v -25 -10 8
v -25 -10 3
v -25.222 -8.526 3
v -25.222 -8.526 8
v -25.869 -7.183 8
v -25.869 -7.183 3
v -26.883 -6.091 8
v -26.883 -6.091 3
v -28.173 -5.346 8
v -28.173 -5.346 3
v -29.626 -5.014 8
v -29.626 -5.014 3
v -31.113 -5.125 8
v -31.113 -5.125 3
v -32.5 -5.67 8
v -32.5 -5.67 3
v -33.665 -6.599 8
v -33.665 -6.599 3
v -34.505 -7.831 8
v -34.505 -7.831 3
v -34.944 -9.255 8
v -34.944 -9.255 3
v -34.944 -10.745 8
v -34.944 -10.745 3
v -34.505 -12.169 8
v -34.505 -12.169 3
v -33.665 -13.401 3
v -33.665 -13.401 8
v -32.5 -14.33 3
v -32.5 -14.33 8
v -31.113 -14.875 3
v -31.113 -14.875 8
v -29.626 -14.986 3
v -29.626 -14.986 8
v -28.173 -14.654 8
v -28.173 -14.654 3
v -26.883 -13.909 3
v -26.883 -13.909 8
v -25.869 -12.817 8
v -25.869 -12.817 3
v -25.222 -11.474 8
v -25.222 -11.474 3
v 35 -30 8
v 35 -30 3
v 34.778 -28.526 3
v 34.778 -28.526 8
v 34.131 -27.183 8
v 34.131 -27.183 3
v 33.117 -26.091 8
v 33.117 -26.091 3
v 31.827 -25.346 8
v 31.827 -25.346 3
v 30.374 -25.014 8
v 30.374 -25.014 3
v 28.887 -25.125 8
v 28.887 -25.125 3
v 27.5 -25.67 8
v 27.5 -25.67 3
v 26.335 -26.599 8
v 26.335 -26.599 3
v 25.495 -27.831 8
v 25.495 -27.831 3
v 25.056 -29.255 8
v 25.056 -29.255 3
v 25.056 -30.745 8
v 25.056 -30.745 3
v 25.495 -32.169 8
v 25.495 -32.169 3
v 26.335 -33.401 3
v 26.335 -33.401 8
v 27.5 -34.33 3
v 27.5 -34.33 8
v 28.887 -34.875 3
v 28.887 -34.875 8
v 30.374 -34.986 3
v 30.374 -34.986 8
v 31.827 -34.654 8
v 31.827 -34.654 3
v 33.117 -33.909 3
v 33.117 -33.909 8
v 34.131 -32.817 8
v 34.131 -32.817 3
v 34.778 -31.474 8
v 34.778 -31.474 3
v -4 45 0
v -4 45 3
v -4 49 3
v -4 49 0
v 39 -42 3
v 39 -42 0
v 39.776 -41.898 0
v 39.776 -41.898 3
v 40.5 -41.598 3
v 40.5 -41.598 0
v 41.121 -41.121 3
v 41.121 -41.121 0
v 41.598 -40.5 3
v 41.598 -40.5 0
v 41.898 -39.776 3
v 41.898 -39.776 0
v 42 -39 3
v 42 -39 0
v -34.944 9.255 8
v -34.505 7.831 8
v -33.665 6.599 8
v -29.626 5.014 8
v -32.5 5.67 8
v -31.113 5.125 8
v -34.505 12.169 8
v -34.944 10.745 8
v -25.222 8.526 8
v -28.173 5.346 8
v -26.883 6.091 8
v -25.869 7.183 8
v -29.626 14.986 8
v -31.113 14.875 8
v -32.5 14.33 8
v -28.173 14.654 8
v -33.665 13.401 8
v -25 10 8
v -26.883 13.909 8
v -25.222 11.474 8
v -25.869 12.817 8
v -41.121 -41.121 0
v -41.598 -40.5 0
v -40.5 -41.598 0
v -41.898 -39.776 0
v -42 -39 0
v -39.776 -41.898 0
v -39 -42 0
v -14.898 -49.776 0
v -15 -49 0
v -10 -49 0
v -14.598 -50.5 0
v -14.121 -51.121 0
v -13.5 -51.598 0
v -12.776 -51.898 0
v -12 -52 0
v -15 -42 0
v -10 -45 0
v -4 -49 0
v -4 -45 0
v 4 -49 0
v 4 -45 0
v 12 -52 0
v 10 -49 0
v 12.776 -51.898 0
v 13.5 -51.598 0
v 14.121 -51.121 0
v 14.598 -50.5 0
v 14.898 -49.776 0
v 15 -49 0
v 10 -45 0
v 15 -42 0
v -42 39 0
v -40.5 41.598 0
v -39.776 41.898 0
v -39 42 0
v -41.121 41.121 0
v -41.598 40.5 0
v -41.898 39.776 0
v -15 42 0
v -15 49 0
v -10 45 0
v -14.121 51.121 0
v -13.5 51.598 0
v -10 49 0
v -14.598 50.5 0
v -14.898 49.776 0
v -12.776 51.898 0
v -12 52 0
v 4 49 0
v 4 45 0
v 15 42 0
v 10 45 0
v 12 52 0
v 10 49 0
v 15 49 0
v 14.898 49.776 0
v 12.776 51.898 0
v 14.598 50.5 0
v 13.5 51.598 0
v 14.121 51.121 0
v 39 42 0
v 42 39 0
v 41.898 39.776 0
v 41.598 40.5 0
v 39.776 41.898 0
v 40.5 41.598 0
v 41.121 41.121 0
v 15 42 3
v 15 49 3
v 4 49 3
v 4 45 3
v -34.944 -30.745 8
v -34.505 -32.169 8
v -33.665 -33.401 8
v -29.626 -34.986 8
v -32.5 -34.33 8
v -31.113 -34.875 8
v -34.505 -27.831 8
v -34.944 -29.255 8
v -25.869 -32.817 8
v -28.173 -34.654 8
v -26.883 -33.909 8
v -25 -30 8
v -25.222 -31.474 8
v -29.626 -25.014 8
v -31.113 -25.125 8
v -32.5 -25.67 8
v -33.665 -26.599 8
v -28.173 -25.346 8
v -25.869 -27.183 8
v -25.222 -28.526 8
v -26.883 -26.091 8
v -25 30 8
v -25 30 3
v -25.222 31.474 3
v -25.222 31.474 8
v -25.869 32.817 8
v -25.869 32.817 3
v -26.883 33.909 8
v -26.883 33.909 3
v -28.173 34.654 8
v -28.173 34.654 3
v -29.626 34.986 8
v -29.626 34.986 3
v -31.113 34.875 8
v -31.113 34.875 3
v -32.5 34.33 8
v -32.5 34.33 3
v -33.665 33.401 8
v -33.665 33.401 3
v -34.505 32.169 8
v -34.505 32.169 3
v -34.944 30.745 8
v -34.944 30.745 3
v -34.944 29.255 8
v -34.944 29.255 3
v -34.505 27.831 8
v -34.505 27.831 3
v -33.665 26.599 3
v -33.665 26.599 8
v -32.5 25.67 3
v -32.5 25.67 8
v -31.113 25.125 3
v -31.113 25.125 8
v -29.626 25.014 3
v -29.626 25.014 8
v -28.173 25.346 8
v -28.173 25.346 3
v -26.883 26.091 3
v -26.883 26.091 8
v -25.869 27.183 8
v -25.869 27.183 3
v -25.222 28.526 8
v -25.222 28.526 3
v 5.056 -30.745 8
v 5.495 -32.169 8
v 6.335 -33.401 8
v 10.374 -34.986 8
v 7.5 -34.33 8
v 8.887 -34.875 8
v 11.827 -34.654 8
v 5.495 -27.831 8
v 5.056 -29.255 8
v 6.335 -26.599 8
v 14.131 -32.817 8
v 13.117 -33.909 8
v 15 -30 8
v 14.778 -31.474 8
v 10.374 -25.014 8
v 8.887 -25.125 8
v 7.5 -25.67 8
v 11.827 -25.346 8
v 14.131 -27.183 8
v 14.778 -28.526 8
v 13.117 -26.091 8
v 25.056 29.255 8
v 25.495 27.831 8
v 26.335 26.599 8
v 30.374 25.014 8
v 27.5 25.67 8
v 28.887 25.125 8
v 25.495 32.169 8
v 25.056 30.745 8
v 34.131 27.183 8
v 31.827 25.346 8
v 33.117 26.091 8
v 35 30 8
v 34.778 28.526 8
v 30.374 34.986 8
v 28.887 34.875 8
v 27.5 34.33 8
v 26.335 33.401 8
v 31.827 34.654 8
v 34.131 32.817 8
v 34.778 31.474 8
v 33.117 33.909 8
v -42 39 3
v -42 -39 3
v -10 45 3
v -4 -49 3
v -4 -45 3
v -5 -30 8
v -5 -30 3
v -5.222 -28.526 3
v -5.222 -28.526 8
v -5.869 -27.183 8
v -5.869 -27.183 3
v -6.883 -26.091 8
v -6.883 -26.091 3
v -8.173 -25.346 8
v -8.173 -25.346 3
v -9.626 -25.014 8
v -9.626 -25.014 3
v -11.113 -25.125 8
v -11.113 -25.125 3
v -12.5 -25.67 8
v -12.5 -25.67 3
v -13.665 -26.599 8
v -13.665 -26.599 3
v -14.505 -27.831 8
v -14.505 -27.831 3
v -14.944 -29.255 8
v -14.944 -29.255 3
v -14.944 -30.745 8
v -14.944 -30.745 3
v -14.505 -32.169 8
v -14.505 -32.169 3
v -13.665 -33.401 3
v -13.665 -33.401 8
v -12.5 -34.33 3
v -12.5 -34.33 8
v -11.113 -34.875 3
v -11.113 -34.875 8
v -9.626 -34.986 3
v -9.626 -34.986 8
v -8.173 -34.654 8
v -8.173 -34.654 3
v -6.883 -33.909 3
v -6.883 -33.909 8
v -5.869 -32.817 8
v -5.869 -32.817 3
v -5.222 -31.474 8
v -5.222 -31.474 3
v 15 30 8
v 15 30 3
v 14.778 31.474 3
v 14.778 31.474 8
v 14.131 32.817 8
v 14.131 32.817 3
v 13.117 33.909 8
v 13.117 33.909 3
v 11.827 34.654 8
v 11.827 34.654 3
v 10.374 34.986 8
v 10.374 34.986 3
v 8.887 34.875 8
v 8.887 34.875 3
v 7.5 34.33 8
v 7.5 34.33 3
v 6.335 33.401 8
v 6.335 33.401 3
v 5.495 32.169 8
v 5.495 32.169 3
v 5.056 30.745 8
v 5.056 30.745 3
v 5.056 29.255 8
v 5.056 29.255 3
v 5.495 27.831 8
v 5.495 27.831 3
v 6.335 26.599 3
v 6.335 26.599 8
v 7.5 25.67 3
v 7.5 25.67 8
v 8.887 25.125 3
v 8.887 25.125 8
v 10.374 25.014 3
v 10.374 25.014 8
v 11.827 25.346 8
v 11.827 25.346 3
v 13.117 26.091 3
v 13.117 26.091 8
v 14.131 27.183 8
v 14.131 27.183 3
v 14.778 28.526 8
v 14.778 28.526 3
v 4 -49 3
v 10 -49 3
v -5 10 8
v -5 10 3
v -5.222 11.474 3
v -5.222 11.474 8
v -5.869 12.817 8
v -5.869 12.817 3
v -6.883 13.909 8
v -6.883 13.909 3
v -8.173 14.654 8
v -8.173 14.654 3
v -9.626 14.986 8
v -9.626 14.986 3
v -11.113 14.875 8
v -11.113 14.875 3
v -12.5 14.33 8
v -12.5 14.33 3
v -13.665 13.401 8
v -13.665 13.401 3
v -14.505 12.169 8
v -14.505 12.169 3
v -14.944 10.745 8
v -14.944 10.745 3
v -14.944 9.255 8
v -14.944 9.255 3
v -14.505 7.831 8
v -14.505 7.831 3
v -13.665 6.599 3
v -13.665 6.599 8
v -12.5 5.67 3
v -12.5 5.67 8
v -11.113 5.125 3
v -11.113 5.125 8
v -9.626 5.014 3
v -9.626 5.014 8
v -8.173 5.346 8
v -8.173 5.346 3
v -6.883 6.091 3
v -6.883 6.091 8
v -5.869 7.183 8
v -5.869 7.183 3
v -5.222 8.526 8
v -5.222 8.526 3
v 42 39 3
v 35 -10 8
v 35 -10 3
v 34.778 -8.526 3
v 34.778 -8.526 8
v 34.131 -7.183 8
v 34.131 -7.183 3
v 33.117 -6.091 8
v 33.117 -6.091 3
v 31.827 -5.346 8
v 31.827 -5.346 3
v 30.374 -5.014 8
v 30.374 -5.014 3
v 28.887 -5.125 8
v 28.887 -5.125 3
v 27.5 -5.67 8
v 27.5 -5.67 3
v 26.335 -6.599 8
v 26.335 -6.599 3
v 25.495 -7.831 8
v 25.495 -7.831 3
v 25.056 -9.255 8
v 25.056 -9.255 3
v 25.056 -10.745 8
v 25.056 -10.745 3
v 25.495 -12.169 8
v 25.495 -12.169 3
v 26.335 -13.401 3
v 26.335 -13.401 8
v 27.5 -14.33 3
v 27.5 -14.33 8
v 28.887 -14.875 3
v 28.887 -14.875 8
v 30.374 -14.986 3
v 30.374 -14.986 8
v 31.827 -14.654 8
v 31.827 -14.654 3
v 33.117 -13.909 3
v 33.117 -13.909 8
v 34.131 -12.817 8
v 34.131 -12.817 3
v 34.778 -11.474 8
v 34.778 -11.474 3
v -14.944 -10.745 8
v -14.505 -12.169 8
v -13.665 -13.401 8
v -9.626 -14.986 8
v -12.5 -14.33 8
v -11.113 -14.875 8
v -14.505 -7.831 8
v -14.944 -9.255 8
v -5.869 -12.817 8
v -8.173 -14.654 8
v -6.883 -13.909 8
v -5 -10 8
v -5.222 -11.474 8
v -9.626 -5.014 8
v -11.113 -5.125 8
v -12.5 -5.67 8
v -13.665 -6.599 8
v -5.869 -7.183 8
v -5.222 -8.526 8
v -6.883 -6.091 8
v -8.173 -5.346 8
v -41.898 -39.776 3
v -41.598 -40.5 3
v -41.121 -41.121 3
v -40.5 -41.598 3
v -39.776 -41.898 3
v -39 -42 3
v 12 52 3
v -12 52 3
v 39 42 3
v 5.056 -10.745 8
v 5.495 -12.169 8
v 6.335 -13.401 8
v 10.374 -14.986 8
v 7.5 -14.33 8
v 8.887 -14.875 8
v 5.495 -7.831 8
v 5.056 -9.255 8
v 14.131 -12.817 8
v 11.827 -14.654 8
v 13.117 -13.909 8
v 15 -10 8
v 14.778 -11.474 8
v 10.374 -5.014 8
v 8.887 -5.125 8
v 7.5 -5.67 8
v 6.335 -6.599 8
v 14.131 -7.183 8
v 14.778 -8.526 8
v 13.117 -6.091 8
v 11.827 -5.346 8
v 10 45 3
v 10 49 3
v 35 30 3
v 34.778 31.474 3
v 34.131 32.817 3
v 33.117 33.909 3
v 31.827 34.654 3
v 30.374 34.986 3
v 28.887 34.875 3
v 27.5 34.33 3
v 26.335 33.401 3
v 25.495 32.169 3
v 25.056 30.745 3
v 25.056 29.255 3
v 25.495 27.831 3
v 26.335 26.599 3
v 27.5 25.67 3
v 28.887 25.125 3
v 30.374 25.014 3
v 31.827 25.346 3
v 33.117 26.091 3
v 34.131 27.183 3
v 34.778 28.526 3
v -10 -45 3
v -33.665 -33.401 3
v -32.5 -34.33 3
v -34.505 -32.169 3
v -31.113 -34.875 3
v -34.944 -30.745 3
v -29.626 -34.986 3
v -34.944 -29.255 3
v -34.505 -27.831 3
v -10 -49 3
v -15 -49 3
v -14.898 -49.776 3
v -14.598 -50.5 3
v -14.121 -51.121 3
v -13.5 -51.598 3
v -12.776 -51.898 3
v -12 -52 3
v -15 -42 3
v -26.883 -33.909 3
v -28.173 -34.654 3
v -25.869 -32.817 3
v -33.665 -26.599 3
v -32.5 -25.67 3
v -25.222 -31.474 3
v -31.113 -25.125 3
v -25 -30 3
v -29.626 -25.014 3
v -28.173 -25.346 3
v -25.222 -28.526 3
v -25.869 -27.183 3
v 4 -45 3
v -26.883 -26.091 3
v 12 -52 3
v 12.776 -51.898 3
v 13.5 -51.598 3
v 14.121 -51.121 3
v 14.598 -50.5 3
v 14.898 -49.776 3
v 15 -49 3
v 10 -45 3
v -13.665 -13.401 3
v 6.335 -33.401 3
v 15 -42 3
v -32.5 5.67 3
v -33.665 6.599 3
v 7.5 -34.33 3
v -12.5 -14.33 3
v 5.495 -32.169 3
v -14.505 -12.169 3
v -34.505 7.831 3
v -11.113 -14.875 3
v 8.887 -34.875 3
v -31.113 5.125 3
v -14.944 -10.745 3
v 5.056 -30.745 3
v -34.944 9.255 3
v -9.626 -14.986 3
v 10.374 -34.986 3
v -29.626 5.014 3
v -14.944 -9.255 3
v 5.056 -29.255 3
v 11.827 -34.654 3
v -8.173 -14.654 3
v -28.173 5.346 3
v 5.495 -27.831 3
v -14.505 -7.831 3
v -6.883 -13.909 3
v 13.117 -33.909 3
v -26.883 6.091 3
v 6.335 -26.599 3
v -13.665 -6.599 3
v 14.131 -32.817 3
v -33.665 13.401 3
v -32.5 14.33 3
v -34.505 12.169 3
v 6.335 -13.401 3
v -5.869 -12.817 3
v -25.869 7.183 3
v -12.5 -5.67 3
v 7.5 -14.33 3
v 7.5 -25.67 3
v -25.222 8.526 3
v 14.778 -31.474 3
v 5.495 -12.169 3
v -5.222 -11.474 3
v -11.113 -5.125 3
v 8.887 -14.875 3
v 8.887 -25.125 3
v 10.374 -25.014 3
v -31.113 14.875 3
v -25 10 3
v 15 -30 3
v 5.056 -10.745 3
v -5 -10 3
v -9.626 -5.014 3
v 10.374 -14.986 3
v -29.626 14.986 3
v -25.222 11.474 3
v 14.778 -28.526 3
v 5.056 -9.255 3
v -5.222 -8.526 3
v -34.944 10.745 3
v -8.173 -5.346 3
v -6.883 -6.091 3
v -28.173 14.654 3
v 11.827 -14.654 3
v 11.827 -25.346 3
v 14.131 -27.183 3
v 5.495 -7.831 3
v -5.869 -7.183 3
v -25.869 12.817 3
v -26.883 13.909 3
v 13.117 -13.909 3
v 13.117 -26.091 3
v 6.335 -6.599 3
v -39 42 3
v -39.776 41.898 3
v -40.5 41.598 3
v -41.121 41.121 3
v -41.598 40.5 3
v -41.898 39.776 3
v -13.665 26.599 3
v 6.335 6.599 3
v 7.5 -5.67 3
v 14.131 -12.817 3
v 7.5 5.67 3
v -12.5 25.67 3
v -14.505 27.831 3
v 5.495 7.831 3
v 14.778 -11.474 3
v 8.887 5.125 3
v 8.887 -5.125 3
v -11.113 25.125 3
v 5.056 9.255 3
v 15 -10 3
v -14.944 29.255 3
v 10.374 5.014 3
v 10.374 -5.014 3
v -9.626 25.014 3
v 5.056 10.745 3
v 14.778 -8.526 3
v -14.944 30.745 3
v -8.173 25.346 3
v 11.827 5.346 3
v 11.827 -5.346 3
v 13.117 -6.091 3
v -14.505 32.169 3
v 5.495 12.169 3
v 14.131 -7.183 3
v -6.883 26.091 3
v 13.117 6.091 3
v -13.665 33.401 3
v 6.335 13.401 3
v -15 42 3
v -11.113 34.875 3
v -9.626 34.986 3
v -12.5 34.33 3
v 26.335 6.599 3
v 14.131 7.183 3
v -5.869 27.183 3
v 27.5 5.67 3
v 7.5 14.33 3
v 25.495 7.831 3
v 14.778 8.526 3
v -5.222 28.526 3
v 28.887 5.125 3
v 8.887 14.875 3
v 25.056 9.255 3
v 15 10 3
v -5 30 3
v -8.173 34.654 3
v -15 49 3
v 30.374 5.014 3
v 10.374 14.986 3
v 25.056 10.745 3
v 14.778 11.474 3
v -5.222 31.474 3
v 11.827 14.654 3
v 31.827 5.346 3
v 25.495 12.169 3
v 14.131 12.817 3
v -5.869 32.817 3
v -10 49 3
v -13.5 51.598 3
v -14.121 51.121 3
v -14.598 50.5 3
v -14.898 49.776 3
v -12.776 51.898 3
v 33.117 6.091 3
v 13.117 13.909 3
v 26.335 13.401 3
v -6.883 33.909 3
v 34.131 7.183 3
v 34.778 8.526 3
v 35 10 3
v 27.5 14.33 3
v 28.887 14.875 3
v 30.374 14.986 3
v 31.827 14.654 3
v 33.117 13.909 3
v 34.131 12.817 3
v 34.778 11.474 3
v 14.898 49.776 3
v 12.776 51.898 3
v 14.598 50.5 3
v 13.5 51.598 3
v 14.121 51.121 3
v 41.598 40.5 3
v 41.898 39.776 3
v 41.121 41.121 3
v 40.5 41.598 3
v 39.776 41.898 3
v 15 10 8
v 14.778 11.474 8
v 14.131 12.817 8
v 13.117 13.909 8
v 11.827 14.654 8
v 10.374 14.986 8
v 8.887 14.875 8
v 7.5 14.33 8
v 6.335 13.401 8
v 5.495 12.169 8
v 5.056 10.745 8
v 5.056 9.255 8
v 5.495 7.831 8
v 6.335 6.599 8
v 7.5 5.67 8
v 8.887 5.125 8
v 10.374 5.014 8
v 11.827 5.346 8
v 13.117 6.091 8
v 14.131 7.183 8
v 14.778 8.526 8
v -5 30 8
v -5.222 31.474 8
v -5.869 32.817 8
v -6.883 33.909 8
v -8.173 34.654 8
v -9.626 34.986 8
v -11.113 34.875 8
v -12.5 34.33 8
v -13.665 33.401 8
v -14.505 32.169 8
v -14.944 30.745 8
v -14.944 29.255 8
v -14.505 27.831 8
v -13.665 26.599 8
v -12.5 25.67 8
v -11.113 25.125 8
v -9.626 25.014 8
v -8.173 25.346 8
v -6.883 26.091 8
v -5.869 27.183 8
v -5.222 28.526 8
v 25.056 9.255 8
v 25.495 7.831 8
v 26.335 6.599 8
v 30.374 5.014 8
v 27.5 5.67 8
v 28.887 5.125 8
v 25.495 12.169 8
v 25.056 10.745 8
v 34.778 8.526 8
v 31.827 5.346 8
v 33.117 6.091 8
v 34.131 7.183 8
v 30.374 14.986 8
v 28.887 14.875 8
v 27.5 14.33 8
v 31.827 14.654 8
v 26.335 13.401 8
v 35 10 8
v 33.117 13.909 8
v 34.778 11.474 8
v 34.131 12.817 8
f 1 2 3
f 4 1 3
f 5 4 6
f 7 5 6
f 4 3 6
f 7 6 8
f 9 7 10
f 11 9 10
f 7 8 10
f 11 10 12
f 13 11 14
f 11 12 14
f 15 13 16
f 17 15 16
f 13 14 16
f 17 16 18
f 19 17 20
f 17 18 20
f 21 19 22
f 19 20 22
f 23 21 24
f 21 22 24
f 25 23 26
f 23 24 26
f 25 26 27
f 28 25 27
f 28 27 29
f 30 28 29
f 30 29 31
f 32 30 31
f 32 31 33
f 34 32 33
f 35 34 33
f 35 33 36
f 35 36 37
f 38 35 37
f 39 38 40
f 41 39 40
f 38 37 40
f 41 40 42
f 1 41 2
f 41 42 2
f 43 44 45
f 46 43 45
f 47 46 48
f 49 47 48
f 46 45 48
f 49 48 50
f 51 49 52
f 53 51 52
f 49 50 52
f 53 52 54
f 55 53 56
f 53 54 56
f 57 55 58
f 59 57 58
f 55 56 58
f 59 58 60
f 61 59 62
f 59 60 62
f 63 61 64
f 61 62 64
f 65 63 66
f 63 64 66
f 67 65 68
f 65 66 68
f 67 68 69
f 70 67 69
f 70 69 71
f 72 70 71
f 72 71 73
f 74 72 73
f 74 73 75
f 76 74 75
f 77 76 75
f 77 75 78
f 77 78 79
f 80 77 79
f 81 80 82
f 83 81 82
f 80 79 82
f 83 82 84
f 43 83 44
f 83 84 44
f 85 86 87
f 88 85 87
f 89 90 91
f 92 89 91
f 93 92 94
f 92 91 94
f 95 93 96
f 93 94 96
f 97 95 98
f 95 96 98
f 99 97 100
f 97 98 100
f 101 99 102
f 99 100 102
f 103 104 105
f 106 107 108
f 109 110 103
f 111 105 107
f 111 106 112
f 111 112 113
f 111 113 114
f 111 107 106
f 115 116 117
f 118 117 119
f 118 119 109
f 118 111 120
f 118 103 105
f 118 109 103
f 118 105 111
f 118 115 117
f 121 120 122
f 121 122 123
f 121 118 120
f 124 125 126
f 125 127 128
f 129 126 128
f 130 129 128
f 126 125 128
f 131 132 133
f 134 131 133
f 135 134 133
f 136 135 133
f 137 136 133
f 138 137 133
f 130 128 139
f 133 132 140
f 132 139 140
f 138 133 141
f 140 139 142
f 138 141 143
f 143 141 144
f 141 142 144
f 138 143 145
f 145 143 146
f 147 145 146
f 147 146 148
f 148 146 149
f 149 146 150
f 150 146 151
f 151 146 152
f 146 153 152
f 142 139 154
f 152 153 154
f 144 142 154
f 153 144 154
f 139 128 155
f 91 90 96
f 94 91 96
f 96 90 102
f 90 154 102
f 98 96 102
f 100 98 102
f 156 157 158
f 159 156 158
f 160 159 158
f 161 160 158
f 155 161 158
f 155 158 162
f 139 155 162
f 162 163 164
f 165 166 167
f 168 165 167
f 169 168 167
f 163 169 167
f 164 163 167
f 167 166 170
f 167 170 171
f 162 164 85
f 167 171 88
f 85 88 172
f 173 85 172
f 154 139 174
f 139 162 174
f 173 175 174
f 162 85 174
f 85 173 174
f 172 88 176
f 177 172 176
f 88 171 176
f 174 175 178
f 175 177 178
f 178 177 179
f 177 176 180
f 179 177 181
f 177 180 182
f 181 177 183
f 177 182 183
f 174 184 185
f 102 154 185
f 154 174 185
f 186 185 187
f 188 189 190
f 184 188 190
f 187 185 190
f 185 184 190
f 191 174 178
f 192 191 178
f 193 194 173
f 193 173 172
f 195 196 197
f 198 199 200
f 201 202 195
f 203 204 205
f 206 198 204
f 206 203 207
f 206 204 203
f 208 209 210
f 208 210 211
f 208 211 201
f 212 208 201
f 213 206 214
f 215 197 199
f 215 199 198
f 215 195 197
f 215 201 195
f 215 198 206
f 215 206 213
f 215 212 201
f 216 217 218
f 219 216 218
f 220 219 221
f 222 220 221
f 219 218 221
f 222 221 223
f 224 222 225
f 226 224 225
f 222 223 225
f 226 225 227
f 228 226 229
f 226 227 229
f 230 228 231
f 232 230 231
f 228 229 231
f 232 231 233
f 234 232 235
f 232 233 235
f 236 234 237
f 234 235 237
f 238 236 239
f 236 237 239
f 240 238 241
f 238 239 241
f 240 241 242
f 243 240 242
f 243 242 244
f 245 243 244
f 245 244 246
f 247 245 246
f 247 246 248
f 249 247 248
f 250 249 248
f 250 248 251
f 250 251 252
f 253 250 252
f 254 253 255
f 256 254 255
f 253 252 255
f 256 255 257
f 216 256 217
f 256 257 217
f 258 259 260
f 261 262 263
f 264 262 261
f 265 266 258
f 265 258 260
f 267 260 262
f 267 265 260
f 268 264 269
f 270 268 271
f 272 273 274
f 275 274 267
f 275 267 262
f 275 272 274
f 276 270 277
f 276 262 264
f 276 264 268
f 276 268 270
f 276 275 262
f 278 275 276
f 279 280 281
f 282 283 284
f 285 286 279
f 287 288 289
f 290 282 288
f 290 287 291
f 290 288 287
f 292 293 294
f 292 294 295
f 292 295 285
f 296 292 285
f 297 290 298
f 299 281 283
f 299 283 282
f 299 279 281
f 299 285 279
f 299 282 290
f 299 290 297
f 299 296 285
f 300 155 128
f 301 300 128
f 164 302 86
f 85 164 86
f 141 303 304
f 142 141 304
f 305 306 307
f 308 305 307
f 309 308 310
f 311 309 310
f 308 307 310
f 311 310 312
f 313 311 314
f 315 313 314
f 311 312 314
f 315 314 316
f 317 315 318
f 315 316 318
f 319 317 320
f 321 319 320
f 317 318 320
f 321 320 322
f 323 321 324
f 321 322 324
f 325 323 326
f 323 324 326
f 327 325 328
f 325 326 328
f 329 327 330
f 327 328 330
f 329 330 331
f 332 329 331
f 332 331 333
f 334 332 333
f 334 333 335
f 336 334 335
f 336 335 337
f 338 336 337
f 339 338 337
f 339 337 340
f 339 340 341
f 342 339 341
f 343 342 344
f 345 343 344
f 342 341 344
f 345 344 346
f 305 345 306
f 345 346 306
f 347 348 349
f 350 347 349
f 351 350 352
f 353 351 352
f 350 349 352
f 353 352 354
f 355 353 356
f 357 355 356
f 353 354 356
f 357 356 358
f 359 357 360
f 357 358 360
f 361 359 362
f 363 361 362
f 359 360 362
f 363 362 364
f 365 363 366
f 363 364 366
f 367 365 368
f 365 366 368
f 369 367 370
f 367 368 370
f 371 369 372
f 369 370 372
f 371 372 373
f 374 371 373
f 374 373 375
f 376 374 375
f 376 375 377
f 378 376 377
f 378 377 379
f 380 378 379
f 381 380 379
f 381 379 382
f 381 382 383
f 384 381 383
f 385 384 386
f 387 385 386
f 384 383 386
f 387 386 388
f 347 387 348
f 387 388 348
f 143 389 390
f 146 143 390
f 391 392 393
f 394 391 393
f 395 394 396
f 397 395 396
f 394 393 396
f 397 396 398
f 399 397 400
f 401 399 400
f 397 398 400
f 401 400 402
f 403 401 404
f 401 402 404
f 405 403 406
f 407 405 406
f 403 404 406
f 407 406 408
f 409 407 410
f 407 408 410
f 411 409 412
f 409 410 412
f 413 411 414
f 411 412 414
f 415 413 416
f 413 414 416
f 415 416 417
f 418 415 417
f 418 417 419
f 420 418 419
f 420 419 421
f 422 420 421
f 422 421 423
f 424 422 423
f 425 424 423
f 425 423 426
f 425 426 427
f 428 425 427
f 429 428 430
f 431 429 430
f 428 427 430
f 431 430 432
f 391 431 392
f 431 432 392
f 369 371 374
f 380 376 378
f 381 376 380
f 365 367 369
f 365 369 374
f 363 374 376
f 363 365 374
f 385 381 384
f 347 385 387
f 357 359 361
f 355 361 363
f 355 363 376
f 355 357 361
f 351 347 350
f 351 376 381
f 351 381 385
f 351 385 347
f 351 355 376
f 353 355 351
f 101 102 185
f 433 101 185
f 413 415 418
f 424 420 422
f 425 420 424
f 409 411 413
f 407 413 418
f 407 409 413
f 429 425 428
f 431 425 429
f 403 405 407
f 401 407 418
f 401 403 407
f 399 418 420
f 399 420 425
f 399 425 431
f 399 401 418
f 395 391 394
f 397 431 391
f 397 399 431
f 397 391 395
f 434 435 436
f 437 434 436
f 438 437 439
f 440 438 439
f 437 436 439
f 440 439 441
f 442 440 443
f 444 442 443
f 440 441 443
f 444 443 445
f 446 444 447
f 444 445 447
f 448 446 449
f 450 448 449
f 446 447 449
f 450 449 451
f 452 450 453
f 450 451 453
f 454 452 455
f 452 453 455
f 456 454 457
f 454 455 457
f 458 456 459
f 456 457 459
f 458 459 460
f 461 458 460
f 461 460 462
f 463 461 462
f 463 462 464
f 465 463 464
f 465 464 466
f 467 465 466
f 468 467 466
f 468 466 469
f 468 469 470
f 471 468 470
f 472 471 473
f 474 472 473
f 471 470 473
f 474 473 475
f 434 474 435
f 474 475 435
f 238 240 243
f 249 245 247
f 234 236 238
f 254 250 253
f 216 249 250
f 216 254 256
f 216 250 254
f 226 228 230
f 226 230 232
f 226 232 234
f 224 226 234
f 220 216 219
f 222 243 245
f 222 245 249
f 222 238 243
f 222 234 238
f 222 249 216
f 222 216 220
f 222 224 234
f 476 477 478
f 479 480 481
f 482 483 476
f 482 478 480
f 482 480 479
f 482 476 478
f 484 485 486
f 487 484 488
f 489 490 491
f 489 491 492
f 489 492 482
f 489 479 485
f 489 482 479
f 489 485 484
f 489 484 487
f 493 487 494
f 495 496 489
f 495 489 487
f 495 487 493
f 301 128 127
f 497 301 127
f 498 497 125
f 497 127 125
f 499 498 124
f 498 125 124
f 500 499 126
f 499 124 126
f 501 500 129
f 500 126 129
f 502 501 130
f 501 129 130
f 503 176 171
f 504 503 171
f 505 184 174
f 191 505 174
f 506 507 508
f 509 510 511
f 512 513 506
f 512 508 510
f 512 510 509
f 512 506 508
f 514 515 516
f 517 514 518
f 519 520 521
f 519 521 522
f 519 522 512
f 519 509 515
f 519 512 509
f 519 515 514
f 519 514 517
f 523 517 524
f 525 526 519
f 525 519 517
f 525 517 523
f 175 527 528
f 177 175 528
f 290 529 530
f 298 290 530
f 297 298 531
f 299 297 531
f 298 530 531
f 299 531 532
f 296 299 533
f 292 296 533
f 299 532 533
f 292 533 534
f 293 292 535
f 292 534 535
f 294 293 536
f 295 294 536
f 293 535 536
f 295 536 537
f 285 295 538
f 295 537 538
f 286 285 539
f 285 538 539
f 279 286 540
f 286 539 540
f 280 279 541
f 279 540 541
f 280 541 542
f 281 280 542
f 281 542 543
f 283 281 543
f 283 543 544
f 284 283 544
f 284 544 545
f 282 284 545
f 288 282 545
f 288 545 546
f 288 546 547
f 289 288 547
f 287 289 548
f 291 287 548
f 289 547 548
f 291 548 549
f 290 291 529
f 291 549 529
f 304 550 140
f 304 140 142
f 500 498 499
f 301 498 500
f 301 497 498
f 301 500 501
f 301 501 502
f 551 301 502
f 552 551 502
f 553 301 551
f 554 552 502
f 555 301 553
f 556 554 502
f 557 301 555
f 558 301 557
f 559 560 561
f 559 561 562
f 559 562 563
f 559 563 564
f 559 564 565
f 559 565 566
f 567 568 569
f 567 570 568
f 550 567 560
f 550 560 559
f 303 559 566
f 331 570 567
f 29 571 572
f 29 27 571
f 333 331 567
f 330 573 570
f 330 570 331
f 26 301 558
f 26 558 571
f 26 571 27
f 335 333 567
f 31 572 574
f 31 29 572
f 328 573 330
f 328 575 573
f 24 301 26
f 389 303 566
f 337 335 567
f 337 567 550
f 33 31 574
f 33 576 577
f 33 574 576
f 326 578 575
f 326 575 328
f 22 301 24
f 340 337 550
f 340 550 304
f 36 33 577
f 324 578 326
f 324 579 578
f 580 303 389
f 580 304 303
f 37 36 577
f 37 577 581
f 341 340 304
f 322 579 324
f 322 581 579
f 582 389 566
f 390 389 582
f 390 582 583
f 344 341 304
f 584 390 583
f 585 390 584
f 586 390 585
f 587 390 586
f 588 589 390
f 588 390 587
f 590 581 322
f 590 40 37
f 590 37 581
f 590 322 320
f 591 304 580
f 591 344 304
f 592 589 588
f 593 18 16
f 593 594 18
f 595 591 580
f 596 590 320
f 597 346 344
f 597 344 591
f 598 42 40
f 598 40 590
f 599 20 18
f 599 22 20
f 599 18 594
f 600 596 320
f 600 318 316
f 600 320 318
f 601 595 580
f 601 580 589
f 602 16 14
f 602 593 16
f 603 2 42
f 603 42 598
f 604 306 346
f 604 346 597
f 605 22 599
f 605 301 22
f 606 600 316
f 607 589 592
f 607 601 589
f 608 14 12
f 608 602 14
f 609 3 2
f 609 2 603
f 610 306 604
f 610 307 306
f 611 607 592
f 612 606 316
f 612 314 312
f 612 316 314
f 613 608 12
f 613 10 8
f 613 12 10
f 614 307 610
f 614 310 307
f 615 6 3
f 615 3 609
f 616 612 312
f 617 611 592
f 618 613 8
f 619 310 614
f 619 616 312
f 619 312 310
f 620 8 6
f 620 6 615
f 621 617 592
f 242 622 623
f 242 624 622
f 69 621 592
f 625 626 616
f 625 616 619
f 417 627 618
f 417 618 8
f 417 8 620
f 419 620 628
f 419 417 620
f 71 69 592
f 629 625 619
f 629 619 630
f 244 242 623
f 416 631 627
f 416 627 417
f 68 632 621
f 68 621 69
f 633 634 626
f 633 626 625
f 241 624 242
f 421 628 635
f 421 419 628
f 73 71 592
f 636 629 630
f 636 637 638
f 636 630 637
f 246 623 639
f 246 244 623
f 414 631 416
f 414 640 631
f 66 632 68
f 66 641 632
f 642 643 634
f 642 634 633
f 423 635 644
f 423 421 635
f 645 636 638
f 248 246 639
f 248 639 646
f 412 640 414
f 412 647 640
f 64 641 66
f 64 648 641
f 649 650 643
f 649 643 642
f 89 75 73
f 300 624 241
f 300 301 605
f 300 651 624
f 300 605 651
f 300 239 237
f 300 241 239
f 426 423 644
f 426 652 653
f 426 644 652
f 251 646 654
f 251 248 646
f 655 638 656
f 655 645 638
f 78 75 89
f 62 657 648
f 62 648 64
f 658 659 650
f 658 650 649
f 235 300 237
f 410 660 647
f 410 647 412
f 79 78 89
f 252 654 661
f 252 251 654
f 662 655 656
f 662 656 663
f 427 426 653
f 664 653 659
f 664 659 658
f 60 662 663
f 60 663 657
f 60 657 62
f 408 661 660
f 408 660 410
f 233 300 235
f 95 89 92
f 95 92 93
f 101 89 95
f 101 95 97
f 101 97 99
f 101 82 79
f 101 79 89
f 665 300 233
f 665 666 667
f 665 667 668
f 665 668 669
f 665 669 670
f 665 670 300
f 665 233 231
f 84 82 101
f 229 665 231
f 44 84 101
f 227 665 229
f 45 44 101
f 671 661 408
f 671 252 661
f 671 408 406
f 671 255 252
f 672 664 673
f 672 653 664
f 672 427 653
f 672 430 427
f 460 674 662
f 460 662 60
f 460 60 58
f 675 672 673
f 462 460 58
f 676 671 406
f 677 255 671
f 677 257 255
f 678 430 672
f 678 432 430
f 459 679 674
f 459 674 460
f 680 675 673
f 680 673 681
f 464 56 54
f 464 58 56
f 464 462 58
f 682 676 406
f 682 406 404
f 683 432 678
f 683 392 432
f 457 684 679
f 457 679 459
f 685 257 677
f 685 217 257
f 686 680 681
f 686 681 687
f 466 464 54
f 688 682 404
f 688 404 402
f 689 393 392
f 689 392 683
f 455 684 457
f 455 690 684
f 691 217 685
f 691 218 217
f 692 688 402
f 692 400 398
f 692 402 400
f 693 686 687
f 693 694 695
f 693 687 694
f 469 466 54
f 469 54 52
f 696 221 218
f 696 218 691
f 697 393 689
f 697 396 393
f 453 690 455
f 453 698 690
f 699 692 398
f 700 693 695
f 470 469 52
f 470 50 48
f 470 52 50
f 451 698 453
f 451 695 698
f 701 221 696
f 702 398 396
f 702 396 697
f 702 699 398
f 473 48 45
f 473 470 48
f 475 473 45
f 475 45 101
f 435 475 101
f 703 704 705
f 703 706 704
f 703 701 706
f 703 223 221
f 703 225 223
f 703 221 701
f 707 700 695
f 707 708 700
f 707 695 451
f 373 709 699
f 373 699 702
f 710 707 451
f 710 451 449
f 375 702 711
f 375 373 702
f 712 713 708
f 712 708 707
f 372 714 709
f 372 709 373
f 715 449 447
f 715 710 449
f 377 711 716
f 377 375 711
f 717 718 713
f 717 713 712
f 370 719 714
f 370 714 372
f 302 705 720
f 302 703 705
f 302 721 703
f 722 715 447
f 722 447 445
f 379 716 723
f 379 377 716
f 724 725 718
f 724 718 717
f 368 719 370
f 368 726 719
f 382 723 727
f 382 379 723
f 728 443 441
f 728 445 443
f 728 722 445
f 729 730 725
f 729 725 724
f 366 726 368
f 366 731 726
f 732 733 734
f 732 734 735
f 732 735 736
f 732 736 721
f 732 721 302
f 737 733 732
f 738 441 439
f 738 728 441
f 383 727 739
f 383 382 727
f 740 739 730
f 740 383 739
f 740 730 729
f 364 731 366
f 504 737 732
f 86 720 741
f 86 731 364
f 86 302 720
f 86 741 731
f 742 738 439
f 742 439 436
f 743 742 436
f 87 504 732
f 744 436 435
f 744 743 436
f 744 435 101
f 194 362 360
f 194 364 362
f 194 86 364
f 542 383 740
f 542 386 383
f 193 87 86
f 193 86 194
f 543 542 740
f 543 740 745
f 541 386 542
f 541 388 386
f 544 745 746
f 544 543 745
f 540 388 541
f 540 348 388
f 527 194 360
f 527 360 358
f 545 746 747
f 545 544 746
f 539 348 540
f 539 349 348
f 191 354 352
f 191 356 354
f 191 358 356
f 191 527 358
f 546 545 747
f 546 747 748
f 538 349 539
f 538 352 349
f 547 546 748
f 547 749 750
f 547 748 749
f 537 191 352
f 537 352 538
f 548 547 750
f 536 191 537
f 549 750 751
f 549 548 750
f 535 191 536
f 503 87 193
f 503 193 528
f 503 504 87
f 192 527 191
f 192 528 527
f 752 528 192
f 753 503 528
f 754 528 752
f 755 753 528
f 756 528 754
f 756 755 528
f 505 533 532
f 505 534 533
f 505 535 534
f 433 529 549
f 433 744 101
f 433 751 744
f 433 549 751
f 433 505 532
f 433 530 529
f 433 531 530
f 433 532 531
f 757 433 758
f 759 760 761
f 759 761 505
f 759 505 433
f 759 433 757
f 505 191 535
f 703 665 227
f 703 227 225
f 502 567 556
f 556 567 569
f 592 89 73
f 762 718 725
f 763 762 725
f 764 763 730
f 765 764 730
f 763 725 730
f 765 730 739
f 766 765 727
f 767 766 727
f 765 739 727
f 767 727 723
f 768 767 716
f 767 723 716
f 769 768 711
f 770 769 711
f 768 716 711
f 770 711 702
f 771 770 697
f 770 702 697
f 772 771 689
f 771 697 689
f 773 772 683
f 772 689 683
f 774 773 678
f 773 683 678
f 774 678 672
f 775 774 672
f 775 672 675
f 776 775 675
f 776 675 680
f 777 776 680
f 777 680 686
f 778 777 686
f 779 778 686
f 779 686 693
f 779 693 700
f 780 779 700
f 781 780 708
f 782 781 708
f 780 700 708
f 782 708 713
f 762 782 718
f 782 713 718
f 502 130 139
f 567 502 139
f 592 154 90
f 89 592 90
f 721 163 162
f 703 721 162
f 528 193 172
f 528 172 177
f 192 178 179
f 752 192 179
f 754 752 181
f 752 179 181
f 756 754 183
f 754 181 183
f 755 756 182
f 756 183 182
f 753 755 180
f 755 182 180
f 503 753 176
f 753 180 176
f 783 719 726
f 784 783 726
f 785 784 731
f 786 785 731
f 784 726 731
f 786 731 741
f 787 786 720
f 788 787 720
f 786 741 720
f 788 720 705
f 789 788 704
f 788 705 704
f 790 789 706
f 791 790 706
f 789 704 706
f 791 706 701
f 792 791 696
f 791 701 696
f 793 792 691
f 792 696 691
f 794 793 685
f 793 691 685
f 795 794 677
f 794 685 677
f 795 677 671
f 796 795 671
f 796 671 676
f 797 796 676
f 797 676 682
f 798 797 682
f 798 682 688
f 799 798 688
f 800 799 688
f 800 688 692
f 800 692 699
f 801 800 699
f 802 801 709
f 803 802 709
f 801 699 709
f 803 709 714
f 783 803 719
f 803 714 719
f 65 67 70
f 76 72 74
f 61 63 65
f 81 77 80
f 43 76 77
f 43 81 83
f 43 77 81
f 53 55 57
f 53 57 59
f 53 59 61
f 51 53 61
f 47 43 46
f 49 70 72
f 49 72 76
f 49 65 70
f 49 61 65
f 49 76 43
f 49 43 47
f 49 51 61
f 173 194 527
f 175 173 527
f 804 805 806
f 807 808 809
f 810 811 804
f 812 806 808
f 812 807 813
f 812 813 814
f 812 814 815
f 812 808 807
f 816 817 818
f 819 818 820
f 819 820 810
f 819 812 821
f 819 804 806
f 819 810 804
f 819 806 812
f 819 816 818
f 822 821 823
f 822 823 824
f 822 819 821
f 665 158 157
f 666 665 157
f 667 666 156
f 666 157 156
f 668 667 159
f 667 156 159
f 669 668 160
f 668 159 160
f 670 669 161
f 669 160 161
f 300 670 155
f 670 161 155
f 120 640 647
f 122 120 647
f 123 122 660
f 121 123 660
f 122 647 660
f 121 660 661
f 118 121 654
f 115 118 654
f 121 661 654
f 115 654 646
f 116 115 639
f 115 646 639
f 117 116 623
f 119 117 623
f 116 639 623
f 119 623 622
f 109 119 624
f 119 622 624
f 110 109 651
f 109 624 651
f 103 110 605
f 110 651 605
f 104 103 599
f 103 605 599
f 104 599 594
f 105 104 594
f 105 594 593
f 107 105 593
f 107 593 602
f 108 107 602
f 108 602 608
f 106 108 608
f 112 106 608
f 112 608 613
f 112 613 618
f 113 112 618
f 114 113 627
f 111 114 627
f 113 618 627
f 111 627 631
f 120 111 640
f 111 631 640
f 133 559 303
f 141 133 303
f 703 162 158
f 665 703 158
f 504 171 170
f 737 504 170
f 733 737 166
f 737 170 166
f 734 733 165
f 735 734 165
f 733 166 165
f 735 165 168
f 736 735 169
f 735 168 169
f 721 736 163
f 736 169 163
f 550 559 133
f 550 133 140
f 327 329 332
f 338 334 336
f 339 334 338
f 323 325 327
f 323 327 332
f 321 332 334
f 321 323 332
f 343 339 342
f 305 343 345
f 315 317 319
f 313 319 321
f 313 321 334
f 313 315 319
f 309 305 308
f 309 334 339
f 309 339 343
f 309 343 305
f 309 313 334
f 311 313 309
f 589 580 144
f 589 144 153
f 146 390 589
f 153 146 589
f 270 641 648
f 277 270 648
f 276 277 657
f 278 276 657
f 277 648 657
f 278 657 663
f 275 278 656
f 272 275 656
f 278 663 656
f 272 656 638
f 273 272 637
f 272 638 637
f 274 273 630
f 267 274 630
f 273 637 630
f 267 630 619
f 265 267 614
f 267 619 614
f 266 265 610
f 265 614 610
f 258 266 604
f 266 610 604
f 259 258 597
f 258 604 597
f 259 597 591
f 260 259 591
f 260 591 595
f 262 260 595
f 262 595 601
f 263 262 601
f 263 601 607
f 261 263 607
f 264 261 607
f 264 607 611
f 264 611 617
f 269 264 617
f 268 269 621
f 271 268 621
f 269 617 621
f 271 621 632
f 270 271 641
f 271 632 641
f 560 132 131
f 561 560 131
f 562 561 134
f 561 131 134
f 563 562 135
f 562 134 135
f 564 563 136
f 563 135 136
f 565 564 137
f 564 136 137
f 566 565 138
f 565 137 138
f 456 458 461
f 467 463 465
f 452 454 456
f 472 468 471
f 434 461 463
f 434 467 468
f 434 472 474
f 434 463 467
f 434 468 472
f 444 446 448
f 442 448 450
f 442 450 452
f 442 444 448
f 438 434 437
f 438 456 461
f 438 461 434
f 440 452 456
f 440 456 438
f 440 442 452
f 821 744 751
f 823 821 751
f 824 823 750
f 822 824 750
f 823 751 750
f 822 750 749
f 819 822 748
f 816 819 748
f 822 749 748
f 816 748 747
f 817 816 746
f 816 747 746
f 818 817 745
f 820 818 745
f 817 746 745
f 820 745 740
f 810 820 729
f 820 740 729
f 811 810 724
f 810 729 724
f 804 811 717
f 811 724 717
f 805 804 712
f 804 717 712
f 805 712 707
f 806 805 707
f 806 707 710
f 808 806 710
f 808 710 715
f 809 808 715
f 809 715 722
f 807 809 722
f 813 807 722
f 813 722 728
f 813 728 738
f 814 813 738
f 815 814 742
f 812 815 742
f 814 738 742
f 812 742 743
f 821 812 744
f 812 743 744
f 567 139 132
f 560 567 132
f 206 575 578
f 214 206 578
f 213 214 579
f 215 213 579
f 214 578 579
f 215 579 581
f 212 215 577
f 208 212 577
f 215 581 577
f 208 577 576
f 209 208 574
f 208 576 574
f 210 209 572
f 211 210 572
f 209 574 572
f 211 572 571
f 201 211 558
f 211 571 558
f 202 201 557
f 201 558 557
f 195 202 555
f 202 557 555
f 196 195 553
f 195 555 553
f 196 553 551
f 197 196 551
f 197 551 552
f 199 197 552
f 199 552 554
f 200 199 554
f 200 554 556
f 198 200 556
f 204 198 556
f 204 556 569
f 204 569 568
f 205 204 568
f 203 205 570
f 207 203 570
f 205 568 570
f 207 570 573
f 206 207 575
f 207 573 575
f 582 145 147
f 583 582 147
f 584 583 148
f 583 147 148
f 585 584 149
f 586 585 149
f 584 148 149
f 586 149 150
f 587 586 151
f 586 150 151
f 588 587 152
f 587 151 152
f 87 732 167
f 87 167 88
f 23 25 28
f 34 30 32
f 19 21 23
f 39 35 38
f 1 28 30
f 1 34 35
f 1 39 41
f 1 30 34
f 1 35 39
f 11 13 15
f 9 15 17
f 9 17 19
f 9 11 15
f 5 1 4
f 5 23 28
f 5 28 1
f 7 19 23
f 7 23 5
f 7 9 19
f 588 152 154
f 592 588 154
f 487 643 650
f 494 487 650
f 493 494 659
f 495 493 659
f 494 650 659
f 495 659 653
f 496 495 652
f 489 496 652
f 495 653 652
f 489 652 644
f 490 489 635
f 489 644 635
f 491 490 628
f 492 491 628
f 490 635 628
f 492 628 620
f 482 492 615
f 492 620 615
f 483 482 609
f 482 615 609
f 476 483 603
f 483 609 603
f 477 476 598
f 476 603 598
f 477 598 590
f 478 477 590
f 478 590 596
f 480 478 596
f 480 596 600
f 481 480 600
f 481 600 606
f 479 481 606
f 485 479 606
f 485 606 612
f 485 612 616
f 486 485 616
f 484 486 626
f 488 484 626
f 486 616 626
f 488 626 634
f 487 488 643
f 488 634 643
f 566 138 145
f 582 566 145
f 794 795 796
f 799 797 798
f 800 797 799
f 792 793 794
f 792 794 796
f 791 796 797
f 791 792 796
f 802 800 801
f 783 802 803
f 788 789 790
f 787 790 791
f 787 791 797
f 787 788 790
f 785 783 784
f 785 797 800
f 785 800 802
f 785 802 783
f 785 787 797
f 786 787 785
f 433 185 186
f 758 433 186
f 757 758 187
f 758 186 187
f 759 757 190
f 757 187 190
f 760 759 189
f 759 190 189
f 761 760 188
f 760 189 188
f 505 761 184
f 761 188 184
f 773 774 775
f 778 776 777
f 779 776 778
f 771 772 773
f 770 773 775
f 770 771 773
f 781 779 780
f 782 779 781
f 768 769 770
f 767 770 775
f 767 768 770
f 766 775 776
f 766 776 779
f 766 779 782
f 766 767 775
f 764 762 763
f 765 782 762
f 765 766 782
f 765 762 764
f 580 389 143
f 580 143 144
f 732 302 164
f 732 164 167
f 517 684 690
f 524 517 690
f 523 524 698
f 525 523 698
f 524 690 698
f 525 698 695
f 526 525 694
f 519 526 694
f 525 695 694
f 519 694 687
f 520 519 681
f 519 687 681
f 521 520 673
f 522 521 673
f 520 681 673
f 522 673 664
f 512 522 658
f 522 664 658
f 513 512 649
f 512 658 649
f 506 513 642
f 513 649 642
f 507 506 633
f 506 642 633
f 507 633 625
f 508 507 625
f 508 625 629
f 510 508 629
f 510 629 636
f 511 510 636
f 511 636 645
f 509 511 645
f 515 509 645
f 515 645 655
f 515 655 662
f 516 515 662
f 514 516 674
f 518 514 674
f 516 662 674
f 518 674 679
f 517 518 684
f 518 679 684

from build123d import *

# Parameters (mm, degrees)
PAD_DEPTH    = 3
SKETCH001_R  = 5
PAD001_DEPTH = 5
SKETCH002_W  = 6
SKETCH002_H  = 4
POCKET_DEPTH = 5


with BuildPart() as part:
    # Sketch → Pad (new body)
    with BuildSketch(Plane.XY):
        with BuildLine():
            Line((42, -39), (42, 39))
            ThreePointArc((42, 39), (41.1213203436, 41.1213203436), (39, 42))
            Line((39, 42), (-39, 42))
            ThreePointArc((-39, 42), (-41.1213203436, 41.1213203436), (-42, 39))
            Line((-42, 39), (-42, -39))
            ThreePointArc((-42, -39), (-41.1213203436, -41.1213203436), (-39, -42))
            Line((-39, -42), (39, -42))
            ThreePointArc((39, -42), (41.1213203436, -41.1213203436), (42, -39))
        make_face()
        with BuildLine():
            Line((-15, 42), (15, 42))
            Line((15, 42), (15, 49))
            ThreePointArc((15, 49), (14.1213203436, 51.1213203436), (12, 52))
            Line((12, 52), (-12, 52))
            ThreePointArc((-12, 52), (-14.1213203436, 51.1213203436), (-15, 49))
            Line((-15, 49), (-15, 42))
        make_face()
        with BuildLine():
            Line((-15, -42), (-15, -49))
            ThreePointArc((-15, -49), (-14.1213203436, -51.1213203436), (-12, -52))
            Line((-12, -52), (12, -52))
            ThreePointArc((12, -52), (14.1213203436, -51.1213203436), (15, -49))
            Line((15, -49), (15, -42))
            Line((15, -42), (-15, -42))
        make_face()
    extrude(amount=PAD_DEPTH)

    # Sketch001 (on Face22 of Pad) → Pad001 (join)
    with BuildSketch(Plane.XY.offset(3)):
        with Locations((-30, 30)):
            Circle(SKETCH001_R)
        with Locations((-10, 30)):
            Circle(SKETCH001_R)
        with Locations((-30, 10)):
            Circle(SKETCH001_R)
        with Locations((-10, 10)):
            Circle(SKETCH001_R)
        with Locations((-30, -10)):
            Circle(SKETCH001_R)
        with Locations((-10, -10)):
            Circle(SKETCH001_R)
        with Locations((-30, -30)):
            Circle(SKETCH001_R)
        with Locations((-10, -30)):
            Circle(SKETCH001_R)
        with Locations((10, 30)):
            Circle(SKETCH001_R)
        with Locations((30, 30)):
            Circle(SKETCH001_R)
        with Locations((10, 10)):
            Circle(SKETCH001_R)
        with Locations((30, 10)):
            Circle(SKETCH001_R)
        with Locations((10, -10)):
            Circle(SKETCH001_R)
        with Locations((30, -10)):
            Circle(SKETCH001_R)
        with Locations((10, -30)):
            Circle(SKETCH001_R)
        with Locations((30, -30)):
            Circle(SKETCH001_R)
    extrude(amount=PAD001_DEPTH)

    # Sketch002 (on Face5 of Pad001) → Pocket (cut)
    with BuildSketch(Plane.XY.offset(3)):
        with Locations((-7, 47)):
            Rectangle(SKETCH002_W, SKETCH002_H)
        with Locations((7, 47)):
            Rectangle(SKETCH002_W, SKETCH002_H)
        with Locations((7, -47)):
            Rectangle(SKETCH002_W, SKETCH002_H)
        with Locations((-7, -47)):
            Rectangle(SKETCH002_W, SKETCH002_H)
    extrude(amount=-POCKET_DEPTH, mode=Mode.SUBTRACT)


solid = part.part
